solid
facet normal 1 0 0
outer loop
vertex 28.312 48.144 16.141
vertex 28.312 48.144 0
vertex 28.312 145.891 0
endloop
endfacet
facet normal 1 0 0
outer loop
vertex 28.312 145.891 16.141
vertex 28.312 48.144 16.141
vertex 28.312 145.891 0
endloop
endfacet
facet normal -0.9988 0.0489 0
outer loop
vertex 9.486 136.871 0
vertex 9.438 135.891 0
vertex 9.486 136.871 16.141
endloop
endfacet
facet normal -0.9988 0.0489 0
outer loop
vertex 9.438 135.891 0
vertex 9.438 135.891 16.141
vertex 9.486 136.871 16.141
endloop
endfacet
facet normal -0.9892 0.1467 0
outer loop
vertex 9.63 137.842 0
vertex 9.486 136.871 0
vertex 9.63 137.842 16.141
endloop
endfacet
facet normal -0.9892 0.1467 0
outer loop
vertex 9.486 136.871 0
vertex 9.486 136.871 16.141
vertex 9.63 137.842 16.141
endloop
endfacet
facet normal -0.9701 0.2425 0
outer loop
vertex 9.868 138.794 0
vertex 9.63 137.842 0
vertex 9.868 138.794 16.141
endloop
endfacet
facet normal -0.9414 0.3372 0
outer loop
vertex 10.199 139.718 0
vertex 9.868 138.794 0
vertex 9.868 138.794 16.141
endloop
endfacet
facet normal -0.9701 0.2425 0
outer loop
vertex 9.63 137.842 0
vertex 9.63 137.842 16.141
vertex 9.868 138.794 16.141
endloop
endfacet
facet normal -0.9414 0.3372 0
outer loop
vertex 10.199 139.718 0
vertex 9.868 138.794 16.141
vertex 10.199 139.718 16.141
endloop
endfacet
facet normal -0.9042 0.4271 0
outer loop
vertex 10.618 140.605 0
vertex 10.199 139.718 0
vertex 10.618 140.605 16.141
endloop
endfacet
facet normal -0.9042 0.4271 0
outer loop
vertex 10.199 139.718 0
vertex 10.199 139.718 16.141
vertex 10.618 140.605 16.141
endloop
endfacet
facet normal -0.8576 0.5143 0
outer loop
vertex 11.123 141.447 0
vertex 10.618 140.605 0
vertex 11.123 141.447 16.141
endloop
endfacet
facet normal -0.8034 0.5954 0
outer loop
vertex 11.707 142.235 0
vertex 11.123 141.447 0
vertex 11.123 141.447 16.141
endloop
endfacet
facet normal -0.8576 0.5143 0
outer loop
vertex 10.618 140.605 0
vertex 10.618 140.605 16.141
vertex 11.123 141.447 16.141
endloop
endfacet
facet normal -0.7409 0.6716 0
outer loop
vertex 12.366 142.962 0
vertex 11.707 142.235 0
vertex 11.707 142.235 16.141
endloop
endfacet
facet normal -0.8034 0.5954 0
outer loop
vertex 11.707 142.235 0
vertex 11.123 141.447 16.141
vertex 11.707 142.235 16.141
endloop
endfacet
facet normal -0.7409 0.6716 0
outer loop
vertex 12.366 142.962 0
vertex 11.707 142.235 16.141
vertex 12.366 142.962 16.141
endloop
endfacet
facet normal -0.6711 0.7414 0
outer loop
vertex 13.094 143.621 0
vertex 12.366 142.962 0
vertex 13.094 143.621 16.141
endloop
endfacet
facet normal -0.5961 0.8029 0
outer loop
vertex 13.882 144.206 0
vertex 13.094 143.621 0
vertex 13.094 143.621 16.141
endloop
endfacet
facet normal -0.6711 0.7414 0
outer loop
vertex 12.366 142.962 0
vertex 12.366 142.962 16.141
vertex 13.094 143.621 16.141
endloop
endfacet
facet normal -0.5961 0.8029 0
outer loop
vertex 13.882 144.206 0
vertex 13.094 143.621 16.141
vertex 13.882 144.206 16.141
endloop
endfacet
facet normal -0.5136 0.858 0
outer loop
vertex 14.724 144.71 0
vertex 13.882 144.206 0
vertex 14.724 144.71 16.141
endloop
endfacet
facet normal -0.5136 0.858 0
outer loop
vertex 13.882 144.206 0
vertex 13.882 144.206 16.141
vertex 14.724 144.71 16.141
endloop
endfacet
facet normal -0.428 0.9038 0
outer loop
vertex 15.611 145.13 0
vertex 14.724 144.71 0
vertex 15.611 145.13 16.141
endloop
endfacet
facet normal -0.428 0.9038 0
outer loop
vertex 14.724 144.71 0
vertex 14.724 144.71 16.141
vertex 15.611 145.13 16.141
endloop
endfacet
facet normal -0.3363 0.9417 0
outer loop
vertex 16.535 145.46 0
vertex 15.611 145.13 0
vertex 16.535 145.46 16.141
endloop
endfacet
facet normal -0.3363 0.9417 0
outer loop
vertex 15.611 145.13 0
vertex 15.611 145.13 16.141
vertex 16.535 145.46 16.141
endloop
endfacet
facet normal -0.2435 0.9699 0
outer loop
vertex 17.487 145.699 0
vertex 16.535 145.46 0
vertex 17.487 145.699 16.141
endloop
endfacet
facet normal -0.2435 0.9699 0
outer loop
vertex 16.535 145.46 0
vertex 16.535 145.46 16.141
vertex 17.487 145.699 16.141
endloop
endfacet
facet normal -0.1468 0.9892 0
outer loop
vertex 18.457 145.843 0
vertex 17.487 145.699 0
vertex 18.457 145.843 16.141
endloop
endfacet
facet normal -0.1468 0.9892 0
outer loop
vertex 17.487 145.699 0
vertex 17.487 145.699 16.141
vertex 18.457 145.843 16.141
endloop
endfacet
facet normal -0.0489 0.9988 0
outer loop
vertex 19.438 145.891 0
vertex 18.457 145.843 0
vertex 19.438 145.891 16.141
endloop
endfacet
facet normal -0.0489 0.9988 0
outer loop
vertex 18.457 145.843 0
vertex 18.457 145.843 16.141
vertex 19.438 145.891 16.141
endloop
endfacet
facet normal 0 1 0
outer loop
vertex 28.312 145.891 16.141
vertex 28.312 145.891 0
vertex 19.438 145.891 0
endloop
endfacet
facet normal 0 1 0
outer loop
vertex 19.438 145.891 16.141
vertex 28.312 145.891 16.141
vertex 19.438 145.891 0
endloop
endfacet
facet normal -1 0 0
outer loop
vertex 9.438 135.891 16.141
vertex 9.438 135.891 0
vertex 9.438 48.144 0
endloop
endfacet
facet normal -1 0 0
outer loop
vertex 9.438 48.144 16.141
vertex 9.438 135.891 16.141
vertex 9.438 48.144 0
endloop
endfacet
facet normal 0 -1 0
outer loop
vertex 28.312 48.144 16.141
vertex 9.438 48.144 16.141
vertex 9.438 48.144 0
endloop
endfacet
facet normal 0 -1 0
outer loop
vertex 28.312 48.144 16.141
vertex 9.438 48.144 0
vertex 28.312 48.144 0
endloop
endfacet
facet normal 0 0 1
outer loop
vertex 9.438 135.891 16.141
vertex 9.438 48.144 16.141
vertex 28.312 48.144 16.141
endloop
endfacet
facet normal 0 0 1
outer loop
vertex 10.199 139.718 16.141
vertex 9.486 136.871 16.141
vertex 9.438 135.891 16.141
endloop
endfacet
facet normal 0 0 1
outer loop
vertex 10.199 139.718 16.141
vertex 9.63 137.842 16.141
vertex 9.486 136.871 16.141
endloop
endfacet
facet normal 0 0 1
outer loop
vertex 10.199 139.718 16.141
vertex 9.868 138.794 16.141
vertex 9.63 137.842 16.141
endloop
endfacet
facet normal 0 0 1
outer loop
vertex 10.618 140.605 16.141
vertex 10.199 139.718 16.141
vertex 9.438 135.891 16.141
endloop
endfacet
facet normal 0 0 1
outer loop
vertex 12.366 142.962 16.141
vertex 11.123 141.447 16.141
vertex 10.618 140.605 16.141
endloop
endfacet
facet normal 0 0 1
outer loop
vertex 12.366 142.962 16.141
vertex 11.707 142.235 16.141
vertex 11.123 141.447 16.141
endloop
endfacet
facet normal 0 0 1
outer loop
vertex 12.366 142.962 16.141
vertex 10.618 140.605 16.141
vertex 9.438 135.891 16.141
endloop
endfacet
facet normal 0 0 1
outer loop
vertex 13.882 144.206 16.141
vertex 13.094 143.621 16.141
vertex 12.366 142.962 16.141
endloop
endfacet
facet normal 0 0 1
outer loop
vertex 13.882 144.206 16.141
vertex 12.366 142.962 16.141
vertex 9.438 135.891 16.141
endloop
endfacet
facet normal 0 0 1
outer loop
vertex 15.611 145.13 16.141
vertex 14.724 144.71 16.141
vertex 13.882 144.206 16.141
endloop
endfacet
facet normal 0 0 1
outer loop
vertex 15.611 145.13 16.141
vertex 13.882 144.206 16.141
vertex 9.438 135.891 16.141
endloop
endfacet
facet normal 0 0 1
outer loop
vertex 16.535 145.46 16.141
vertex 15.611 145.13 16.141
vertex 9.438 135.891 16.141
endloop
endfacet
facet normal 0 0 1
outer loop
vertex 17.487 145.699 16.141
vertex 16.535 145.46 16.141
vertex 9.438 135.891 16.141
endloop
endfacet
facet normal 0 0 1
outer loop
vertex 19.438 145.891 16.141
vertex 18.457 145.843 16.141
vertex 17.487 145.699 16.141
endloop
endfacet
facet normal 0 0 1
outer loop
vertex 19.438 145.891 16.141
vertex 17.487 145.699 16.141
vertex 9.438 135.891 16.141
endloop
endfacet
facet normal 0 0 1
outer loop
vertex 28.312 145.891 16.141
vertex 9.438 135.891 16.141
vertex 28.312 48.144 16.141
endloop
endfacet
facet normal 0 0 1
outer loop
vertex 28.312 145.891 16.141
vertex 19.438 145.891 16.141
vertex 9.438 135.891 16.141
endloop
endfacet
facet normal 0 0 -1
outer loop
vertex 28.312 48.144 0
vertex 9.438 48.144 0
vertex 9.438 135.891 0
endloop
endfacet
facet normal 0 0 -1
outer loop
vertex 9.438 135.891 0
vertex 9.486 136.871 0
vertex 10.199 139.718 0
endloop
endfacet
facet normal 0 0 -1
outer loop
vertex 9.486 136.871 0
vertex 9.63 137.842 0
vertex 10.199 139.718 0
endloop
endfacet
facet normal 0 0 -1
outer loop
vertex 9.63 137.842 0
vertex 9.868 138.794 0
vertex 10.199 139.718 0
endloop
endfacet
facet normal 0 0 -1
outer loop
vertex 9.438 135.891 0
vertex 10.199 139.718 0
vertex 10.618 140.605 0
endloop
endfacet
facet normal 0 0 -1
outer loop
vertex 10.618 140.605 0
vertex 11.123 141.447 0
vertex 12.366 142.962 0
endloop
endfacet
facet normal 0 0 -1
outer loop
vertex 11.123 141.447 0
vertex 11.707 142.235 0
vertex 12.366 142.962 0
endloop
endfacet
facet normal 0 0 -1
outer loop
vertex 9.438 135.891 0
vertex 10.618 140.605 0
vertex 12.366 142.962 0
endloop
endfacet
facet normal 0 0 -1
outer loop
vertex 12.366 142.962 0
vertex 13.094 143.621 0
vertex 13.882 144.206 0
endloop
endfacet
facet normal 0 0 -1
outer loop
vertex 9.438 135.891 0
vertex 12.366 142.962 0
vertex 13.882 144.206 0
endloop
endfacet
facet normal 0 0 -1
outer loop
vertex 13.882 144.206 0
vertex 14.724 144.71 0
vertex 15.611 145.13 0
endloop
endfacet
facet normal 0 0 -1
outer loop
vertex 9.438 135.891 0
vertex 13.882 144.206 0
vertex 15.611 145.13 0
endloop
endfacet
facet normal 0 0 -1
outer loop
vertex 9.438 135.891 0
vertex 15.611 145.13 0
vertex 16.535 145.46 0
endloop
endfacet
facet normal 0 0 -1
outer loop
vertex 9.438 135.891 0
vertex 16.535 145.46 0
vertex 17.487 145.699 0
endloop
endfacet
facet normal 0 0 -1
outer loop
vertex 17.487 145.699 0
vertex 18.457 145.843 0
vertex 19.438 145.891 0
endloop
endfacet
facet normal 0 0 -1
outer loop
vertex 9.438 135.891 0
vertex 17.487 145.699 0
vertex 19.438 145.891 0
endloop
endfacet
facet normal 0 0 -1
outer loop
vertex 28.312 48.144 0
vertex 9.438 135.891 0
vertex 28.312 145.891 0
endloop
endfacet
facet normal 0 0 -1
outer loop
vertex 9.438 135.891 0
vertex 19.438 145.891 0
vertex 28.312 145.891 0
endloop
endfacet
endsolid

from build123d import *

# Parameters (mm, degrees)
SKETCH1_R           = 1.7
BOSS_EXTRUDE3_DEPTH = 16.141
CUT_EXTRUDE1_DEPTH  = 152.557838009
FILLET1_R           = 10


with BuildPart() as part:
    # Sketch1 → Boss-Extrude3 (new body)
    with BuildSketch(Plane.XY):
        Polygon((0, 0), (37.75, 0), (37.75, 29.178), (28.3125, 48.144), (28.3125, 145.891), (9.4375, 145.891), (9.4375, 48.144), (0, 29.178), align=None)
        with Locations((5.6625, 8.494)):
            Circle(SKETCH1_R, mode=Mode.SUBTRACT)
        with Locations((32.0875, 8.494)):
            Circle(SKETCH1_R, mode=Mode.SUBTRACT)
    extrude(amount=BOSS_EXTRUDE3_DEPTH)

    # Sketch2 → Cut-Extrude1 (cut, through all)
    with BuildSketch(Plane.XY.offset(16.141)):
        Polygon((9.4375, 48.144), (28.3125, 48.144), (37.75, 29.178), (37.75, 0), (0, 0), (0, 29.178), align=None)
    extrude(amount=-CUT_EXTRUDE1_DEPTH, mode=Mode.SUBTRACT)

    # Fillet1
    fillet1_edges = [part.edges().sort_by_distance(p)[0] for p in [
        (9.4375, 145.891, 8.0705),
    ]]
    fillet(fillet1_edges, radius=FILLET1_R)


solid = part.part
